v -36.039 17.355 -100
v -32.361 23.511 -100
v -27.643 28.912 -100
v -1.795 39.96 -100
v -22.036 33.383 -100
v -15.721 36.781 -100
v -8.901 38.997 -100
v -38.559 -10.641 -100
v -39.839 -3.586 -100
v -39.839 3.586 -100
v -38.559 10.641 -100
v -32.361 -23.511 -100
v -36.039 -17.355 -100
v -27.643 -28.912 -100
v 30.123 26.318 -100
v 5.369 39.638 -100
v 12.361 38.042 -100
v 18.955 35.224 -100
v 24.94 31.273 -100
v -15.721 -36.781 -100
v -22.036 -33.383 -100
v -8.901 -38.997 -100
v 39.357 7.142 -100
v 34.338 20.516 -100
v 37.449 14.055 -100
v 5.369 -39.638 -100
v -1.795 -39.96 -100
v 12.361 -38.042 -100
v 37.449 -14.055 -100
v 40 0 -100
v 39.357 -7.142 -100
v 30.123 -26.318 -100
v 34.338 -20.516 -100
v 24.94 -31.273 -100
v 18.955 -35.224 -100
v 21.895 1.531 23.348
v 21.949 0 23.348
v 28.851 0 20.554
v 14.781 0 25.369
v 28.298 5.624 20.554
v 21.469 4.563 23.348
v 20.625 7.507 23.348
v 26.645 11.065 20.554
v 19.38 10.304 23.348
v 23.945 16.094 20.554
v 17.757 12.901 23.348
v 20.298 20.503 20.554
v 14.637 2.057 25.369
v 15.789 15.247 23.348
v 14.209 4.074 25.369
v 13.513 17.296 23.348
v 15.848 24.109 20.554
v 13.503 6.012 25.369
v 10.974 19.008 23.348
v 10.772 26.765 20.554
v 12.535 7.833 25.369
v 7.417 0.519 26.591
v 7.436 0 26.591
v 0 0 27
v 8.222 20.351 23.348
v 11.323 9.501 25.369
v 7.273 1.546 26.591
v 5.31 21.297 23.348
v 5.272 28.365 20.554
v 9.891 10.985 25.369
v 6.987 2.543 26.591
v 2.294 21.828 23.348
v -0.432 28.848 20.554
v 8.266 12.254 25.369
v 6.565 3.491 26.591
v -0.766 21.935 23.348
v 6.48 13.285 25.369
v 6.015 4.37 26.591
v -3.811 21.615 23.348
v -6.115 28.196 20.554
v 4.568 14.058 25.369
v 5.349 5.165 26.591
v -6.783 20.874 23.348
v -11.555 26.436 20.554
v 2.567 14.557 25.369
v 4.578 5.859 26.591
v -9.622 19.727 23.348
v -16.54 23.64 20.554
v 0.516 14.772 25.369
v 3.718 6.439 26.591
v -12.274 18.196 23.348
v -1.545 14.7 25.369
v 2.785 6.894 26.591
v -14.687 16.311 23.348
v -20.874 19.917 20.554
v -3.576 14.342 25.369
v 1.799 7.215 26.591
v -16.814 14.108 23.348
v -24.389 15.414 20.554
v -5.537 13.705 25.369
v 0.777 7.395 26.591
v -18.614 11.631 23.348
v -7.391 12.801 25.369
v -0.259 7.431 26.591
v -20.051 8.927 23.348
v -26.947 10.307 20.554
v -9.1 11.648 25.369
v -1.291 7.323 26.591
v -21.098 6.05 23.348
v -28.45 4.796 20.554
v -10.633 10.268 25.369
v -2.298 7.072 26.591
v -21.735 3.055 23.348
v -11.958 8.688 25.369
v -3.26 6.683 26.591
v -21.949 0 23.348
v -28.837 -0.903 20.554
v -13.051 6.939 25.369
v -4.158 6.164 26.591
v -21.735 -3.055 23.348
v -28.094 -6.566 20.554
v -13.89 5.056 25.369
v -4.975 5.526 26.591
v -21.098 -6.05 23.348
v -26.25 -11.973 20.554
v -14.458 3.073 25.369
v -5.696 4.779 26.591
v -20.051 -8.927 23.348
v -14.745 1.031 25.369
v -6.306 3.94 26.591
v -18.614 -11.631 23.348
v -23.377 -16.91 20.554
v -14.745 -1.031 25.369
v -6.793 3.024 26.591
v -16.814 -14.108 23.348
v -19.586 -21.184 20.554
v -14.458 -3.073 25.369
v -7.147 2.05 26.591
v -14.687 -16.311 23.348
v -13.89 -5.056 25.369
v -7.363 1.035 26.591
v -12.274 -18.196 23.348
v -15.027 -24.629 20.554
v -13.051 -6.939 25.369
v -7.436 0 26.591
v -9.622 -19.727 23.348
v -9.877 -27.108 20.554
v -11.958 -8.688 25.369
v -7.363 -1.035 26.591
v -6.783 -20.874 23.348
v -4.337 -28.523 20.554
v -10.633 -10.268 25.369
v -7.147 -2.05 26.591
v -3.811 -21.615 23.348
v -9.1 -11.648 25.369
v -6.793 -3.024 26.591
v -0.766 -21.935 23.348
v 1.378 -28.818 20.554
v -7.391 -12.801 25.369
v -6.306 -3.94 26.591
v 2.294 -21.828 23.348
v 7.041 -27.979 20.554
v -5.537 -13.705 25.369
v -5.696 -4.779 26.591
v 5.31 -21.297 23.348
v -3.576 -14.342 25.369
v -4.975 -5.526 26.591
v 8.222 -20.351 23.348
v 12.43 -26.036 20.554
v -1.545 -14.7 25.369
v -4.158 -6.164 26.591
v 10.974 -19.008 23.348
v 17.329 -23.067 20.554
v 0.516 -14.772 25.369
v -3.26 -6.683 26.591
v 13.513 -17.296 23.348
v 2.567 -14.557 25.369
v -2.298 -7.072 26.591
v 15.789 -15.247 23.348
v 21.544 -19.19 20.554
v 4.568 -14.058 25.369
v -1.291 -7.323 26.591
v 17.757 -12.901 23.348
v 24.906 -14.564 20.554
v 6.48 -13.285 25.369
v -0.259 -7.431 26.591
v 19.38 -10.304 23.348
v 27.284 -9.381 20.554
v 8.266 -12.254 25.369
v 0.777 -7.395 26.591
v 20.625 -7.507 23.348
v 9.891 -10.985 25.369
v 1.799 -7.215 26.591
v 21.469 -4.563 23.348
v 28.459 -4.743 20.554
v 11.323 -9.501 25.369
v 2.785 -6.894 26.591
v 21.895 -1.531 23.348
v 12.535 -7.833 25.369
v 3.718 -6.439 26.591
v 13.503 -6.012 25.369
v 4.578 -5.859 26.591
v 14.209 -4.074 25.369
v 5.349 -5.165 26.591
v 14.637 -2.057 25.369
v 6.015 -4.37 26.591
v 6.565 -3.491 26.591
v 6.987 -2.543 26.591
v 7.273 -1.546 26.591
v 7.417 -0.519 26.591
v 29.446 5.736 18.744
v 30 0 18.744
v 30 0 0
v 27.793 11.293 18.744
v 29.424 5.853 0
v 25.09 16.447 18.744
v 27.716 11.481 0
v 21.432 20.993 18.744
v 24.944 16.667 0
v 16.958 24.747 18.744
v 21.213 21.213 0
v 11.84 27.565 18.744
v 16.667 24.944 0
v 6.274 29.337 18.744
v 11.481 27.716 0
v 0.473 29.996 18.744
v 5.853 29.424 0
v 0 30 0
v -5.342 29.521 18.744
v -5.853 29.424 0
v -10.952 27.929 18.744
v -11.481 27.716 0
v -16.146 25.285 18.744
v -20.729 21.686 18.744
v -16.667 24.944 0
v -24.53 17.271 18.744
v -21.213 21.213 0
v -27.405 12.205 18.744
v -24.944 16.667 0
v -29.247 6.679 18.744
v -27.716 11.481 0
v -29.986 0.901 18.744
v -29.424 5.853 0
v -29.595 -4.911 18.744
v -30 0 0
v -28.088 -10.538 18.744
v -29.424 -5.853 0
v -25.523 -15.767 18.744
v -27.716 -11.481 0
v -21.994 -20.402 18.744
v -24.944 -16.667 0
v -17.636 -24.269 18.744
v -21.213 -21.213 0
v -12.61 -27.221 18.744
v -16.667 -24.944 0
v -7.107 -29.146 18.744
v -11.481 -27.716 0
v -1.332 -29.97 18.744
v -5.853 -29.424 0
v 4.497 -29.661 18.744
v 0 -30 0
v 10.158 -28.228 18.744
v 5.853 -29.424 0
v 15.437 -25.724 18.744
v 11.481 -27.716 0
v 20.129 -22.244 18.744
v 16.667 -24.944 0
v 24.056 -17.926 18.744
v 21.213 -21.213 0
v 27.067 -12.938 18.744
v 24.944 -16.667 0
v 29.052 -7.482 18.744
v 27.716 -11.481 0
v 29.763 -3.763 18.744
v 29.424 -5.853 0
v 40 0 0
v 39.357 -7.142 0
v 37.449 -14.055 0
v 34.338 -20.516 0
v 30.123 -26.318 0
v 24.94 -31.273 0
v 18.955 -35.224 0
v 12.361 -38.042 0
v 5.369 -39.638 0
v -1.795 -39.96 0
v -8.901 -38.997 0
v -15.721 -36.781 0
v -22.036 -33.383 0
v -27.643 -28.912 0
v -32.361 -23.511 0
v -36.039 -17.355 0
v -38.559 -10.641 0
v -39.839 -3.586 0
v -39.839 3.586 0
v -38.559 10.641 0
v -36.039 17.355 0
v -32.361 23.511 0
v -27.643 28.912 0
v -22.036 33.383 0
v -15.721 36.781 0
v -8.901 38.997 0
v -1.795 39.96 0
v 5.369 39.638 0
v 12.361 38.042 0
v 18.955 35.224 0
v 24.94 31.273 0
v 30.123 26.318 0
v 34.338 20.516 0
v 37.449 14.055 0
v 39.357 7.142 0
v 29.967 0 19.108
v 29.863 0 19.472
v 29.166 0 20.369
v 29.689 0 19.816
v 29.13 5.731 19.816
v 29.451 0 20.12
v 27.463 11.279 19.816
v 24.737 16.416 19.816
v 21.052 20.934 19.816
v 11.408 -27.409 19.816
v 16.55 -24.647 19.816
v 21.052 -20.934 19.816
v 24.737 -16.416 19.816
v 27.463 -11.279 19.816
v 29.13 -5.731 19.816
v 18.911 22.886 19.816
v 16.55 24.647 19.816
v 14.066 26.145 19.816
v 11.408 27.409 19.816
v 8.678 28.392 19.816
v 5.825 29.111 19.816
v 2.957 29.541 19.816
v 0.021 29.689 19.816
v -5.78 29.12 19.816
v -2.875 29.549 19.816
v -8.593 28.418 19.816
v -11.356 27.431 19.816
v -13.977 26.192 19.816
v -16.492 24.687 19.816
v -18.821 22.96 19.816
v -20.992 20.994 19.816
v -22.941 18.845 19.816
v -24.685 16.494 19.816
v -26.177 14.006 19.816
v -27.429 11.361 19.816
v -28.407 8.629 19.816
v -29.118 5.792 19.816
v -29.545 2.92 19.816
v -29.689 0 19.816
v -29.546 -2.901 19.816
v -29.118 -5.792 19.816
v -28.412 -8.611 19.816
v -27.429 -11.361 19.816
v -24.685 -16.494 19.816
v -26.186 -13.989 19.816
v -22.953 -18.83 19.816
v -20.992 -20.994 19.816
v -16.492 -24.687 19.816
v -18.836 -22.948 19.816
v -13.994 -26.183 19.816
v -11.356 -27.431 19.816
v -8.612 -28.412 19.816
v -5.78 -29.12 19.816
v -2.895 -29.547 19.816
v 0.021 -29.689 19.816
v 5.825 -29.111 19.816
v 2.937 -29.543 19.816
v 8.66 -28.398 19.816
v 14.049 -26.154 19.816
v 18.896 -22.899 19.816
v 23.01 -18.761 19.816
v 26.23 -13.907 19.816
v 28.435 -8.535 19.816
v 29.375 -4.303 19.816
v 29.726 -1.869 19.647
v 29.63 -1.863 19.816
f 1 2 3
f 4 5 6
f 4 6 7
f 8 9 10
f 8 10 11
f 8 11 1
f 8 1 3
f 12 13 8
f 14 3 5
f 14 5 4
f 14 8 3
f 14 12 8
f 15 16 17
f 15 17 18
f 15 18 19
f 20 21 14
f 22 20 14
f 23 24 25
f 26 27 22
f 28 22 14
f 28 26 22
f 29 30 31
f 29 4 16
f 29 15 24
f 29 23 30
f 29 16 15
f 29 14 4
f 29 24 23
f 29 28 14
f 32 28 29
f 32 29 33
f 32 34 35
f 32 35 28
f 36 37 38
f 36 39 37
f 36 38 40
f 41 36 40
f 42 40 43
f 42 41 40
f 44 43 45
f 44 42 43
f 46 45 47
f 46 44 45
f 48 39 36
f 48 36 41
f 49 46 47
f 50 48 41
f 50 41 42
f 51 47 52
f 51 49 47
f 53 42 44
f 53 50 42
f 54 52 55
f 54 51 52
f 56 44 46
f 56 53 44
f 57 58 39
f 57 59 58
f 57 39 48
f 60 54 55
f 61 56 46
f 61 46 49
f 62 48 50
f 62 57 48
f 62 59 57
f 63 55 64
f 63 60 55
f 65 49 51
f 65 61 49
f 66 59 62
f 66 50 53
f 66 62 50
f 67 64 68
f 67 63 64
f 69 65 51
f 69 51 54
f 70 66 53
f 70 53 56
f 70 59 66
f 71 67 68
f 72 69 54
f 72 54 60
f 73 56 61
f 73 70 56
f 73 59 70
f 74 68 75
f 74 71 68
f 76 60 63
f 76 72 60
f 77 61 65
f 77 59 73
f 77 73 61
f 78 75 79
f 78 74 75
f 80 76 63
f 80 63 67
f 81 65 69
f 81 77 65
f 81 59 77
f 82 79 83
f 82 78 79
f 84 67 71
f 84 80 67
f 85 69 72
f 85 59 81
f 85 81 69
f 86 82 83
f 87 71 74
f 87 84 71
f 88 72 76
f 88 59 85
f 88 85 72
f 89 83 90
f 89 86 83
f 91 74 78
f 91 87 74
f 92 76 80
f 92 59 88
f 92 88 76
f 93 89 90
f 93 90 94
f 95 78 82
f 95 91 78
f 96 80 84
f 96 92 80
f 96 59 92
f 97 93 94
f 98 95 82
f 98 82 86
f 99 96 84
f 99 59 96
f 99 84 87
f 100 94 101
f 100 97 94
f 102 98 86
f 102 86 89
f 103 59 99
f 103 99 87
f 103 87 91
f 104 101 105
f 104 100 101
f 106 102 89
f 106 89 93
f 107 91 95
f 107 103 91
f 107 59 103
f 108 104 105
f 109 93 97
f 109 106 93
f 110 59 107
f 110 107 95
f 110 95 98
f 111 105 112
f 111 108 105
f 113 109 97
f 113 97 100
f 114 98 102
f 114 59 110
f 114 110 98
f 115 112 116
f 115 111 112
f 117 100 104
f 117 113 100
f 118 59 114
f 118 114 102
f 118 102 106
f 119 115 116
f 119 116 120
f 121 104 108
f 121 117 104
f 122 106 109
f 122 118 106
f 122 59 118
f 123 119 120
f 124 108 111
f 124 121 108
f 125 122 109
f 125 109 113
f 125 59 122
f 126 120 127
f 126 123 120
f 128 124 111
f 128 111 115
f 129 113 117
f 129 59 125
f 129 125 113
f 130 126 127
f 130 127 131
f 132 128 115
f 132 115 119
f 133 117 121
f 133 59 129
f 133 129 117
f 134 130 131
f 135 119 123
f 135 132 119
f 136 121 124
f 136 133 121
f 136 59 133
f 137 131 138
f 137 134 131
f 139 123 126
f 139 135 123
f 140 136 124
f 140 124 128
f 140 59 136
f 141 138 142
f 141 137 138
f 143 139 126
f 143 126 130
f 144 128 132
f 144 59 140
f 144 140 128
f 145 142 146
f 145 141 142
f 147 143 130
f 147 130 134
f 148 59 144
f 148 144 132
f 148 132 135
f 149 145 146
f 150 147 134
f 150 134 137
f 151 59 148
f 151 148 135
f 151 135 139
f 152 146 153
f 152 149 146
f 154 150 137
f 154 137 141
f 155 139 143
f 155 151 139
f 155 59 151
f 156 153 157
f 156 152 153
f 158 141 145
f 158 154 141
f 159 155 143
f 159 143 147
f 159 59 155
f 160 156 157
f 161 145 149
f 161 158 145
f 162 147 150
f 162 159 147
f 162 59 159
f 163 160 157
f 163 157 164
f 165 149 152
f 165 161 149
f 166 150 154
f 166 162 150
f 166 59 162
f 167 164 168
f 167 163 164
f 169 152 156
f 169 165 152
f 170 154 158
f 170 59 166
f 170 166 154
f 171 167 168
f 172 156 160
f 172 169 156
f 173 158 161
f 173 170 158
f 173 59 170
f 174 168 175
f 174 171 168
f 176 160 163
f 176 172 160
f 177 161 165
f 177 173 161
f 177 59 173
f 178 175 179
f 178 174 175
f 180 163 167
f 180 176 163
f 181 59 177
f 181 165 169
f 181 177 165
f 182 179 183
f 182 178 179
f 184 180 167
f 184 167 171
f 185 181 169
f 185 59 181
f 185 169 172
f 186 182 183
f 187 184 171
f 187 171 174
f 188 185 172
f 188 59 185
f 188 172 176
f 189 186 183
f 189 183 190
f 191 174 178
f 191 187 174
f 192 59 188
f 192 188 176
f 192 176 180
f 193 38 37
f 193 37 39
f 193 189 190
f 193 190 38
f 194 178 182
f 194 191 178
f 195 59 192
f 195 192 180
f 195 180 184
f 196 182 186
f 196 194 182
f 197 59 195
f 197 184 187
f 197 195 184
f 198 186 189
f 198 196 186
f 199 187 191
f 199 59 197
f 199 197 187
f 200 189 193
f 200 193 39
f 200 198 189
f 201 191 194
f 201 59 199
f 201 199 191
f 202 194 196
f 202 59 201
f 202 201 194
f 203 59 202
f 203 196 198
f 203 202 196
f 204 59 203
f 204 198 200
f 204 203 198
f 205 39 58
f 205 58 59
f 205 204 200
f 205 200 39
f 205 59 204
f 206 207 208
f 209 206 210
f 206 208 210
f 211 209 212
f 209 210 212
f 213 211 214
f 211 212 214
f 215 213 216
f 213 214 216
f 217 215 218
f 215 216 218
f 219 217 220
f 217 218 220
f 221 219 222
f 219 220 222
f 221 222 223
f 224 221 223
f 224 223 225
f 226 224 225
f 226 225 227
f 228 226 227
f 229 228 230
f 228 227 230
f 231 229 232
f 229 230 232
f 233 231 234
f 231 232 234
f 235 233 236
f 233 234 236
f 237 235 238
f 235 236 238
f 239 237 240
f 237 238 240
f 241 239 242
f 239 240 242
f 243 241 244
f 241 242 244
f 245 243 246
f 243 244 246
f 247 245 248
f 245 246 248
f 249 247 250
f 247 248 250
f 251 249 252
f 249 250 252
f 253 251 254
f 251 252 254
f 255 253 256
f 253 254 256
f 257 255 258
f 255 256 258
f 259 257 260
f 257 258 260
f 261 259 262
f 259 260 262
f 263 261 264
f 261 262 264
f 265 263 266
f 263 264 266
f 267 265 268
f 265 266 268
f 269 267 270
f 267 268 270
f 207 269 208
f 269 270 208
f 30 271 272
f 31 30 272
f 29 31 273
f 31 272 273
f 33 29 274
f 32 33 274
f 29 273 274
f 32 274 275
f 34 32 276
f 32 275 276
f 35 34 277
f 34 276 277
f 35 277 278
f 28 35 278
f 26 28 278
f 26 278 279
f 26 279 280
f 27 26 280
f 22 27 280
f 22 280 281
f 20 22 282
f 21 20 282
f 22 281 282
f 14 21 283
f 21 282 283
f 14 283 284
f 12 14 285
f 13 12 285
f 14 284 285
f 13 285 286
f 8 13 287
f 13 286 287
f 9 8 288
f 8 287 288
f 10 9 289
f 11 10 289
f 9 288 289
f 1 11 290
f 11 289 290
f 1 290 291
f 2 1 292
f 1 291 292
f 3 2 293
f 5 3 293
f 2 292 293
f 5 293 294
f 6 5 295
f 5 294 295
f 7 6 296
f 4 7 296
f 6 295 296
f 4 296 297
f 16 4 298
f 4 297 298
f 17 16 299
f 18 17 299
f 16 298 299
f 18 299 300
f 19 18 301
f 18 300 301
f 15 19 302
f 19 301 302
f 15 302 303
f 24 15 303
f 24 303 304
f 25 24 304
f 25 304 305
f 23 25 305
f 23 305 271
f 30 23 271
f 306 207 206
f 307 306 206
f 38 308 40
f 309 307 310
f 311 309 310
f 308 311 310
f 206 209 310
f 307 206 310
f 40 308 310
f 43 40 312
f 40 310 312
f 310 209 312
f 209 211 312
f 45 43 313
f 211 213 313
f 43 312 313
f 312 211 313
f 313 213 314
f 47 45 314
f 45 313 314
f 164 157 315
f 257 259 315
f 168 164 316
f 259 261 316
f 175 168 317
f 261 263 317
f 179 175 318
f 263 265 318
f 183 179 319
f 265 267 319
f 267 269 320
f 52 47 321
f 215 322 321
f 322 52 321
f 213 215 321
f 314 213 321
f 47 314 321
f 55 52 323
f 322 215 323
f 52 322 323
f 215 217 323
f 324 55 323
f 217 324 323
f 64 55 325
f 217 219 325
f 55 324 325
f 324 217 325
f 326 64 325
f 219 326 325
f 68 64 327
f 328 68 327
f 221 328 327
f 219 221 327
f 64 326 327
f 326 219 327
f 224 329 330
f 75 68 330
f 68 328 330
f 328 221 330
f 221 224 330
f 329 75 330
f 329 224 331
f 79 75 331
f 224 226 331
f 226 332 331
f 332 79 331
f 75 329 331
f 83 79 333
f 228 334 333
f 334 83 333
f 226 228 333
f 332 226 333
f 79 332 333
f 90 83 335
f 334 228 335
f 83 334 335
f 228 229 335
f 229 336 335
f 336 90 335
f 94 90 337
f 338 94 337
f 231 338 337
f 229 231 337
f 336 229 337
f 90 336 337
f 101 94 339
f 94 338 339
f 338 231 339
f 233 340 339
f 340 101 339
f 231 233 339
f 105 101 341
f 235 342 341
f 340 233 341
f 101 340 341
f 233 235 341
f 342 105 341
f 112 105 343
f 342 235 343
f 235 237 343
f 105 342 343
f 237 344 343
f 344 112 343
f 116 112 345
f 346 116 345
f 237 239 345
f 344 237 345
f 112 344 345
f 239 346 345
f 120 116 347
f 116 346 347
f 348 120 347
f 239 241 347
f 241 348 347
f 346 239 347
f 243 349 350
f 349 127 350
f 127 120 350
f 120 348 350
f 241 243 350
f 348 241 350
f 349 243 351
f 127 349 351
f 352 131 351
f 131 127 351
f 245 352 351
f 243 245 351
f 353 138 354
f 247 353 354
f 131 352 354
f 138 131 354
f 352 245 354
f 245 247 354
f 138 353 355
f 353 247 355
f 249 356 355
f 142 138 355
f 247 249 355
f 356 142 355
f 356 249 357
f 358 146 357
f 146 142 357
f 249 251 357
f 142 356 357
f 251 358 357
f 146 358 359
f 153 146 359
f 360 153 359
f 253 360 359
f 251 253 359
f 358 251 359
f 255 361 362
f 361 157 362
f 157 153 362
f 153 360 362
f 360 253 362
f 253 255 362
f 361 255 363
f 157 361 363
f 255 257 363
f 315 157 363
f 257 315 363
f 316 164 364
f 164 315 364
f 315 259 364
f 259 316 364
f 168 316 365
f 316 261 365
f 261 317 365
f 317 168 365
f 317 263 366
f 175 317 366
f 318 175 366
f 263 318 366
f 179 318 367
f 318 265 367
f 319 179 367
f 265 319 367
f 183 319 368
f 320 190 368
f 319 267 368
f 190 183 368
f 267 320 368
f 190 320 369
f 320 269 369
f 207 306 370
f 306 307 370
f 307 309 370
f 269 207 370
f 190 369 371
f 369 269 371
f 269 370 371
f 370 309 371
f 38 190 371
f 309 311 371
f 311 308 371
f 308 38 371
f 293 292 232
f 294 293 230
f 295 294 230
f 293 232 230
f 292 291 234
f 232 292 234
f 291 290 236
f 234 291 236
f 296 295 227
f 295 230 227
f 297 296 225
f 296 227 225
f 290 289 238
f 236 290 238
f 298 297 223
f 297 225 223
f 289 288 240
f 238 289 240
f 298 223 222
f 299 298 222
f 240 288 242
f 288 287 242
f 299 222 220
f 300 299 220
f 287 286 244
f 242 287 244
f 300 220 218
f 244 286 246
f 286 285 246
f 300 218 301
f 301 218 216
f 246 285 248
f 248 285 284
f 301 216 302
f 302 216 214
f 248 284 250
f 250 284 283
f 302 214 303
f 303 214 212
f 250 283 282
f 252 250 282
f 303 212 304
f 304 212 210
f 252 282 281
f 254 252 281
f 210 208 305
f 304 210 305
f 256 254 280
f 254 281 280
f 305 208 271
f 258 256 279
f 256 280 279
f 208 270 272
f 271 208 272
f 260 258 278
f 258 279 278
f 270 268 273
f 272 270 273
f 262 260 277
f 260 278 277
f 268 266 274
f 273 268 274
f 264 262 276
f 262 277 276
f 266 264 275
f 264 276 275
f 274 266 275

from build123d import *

# Parameters (mm, degrees)
SKETCH1_R           = 30
BOSS_EXTRUDE1_DEPTH = 20
DOME1_FACE_RADIUS   = 30
DOME1_HEIGHT        = 7
SKETCH2_R           = 40
BOSS_EXTRUDE2_DEPTH = 100
FILLET1_R           = 2


with BuildPart() as part:
    # Sketch1 → Boss-Extrude1 (new body)
    with BuildSketch(Plane.XY):
        Circle(SKETCH1_R)
    extrude(amount=BOSS_EXTRUDE1_DEPTH)

    # Dome1: a dome of height H over a round flat face of radius A is a cap of a sphere of radius (A * A + H * H) / (2 * H)
    dome1_r = (DOME1_FACE_RADIUS * DOME1_FACE_RADIUS + DOME1_HEIGHT * DOME1_HEIGHT) / (2 * DOME1_HEIGHT)
    dome1_base = Plane((0, 0, 20), z_dir=(0, 0, 1))
    with Locations(dome1_base.offset(DOME1_HEIGHT - dome1_r)):
        dome1_ball = Sphere(dome1_r, mode=Mode.PRIVATE)
    add(split(dome1_ball, bisect_by=dome1_base, keep=Keep.TOP, mode=Mode.PRIVATE))

    # Sketch2 → Boss-Extrude2 (add)
    with BuildSketch(Plane(origin=(0, 0, 0), x_dir=(-1, 0, 0), z_dir=(0, 0, -1))):
        with Locations(Location((0, 0, 0), (0, 0, 180))):
            Circle(SKETCH2_R)
    extrude(amount=BOSS_EXTRUDE2_DEPTH)

    # Fillet1
    fillet1_edges = [part.edges().sort_by_distance(p)[0] for p in [
        (-30, 0, 20),
    ]]
    fillet(fillet1_edges, radius=FILLET1_R)


solid = part.part
